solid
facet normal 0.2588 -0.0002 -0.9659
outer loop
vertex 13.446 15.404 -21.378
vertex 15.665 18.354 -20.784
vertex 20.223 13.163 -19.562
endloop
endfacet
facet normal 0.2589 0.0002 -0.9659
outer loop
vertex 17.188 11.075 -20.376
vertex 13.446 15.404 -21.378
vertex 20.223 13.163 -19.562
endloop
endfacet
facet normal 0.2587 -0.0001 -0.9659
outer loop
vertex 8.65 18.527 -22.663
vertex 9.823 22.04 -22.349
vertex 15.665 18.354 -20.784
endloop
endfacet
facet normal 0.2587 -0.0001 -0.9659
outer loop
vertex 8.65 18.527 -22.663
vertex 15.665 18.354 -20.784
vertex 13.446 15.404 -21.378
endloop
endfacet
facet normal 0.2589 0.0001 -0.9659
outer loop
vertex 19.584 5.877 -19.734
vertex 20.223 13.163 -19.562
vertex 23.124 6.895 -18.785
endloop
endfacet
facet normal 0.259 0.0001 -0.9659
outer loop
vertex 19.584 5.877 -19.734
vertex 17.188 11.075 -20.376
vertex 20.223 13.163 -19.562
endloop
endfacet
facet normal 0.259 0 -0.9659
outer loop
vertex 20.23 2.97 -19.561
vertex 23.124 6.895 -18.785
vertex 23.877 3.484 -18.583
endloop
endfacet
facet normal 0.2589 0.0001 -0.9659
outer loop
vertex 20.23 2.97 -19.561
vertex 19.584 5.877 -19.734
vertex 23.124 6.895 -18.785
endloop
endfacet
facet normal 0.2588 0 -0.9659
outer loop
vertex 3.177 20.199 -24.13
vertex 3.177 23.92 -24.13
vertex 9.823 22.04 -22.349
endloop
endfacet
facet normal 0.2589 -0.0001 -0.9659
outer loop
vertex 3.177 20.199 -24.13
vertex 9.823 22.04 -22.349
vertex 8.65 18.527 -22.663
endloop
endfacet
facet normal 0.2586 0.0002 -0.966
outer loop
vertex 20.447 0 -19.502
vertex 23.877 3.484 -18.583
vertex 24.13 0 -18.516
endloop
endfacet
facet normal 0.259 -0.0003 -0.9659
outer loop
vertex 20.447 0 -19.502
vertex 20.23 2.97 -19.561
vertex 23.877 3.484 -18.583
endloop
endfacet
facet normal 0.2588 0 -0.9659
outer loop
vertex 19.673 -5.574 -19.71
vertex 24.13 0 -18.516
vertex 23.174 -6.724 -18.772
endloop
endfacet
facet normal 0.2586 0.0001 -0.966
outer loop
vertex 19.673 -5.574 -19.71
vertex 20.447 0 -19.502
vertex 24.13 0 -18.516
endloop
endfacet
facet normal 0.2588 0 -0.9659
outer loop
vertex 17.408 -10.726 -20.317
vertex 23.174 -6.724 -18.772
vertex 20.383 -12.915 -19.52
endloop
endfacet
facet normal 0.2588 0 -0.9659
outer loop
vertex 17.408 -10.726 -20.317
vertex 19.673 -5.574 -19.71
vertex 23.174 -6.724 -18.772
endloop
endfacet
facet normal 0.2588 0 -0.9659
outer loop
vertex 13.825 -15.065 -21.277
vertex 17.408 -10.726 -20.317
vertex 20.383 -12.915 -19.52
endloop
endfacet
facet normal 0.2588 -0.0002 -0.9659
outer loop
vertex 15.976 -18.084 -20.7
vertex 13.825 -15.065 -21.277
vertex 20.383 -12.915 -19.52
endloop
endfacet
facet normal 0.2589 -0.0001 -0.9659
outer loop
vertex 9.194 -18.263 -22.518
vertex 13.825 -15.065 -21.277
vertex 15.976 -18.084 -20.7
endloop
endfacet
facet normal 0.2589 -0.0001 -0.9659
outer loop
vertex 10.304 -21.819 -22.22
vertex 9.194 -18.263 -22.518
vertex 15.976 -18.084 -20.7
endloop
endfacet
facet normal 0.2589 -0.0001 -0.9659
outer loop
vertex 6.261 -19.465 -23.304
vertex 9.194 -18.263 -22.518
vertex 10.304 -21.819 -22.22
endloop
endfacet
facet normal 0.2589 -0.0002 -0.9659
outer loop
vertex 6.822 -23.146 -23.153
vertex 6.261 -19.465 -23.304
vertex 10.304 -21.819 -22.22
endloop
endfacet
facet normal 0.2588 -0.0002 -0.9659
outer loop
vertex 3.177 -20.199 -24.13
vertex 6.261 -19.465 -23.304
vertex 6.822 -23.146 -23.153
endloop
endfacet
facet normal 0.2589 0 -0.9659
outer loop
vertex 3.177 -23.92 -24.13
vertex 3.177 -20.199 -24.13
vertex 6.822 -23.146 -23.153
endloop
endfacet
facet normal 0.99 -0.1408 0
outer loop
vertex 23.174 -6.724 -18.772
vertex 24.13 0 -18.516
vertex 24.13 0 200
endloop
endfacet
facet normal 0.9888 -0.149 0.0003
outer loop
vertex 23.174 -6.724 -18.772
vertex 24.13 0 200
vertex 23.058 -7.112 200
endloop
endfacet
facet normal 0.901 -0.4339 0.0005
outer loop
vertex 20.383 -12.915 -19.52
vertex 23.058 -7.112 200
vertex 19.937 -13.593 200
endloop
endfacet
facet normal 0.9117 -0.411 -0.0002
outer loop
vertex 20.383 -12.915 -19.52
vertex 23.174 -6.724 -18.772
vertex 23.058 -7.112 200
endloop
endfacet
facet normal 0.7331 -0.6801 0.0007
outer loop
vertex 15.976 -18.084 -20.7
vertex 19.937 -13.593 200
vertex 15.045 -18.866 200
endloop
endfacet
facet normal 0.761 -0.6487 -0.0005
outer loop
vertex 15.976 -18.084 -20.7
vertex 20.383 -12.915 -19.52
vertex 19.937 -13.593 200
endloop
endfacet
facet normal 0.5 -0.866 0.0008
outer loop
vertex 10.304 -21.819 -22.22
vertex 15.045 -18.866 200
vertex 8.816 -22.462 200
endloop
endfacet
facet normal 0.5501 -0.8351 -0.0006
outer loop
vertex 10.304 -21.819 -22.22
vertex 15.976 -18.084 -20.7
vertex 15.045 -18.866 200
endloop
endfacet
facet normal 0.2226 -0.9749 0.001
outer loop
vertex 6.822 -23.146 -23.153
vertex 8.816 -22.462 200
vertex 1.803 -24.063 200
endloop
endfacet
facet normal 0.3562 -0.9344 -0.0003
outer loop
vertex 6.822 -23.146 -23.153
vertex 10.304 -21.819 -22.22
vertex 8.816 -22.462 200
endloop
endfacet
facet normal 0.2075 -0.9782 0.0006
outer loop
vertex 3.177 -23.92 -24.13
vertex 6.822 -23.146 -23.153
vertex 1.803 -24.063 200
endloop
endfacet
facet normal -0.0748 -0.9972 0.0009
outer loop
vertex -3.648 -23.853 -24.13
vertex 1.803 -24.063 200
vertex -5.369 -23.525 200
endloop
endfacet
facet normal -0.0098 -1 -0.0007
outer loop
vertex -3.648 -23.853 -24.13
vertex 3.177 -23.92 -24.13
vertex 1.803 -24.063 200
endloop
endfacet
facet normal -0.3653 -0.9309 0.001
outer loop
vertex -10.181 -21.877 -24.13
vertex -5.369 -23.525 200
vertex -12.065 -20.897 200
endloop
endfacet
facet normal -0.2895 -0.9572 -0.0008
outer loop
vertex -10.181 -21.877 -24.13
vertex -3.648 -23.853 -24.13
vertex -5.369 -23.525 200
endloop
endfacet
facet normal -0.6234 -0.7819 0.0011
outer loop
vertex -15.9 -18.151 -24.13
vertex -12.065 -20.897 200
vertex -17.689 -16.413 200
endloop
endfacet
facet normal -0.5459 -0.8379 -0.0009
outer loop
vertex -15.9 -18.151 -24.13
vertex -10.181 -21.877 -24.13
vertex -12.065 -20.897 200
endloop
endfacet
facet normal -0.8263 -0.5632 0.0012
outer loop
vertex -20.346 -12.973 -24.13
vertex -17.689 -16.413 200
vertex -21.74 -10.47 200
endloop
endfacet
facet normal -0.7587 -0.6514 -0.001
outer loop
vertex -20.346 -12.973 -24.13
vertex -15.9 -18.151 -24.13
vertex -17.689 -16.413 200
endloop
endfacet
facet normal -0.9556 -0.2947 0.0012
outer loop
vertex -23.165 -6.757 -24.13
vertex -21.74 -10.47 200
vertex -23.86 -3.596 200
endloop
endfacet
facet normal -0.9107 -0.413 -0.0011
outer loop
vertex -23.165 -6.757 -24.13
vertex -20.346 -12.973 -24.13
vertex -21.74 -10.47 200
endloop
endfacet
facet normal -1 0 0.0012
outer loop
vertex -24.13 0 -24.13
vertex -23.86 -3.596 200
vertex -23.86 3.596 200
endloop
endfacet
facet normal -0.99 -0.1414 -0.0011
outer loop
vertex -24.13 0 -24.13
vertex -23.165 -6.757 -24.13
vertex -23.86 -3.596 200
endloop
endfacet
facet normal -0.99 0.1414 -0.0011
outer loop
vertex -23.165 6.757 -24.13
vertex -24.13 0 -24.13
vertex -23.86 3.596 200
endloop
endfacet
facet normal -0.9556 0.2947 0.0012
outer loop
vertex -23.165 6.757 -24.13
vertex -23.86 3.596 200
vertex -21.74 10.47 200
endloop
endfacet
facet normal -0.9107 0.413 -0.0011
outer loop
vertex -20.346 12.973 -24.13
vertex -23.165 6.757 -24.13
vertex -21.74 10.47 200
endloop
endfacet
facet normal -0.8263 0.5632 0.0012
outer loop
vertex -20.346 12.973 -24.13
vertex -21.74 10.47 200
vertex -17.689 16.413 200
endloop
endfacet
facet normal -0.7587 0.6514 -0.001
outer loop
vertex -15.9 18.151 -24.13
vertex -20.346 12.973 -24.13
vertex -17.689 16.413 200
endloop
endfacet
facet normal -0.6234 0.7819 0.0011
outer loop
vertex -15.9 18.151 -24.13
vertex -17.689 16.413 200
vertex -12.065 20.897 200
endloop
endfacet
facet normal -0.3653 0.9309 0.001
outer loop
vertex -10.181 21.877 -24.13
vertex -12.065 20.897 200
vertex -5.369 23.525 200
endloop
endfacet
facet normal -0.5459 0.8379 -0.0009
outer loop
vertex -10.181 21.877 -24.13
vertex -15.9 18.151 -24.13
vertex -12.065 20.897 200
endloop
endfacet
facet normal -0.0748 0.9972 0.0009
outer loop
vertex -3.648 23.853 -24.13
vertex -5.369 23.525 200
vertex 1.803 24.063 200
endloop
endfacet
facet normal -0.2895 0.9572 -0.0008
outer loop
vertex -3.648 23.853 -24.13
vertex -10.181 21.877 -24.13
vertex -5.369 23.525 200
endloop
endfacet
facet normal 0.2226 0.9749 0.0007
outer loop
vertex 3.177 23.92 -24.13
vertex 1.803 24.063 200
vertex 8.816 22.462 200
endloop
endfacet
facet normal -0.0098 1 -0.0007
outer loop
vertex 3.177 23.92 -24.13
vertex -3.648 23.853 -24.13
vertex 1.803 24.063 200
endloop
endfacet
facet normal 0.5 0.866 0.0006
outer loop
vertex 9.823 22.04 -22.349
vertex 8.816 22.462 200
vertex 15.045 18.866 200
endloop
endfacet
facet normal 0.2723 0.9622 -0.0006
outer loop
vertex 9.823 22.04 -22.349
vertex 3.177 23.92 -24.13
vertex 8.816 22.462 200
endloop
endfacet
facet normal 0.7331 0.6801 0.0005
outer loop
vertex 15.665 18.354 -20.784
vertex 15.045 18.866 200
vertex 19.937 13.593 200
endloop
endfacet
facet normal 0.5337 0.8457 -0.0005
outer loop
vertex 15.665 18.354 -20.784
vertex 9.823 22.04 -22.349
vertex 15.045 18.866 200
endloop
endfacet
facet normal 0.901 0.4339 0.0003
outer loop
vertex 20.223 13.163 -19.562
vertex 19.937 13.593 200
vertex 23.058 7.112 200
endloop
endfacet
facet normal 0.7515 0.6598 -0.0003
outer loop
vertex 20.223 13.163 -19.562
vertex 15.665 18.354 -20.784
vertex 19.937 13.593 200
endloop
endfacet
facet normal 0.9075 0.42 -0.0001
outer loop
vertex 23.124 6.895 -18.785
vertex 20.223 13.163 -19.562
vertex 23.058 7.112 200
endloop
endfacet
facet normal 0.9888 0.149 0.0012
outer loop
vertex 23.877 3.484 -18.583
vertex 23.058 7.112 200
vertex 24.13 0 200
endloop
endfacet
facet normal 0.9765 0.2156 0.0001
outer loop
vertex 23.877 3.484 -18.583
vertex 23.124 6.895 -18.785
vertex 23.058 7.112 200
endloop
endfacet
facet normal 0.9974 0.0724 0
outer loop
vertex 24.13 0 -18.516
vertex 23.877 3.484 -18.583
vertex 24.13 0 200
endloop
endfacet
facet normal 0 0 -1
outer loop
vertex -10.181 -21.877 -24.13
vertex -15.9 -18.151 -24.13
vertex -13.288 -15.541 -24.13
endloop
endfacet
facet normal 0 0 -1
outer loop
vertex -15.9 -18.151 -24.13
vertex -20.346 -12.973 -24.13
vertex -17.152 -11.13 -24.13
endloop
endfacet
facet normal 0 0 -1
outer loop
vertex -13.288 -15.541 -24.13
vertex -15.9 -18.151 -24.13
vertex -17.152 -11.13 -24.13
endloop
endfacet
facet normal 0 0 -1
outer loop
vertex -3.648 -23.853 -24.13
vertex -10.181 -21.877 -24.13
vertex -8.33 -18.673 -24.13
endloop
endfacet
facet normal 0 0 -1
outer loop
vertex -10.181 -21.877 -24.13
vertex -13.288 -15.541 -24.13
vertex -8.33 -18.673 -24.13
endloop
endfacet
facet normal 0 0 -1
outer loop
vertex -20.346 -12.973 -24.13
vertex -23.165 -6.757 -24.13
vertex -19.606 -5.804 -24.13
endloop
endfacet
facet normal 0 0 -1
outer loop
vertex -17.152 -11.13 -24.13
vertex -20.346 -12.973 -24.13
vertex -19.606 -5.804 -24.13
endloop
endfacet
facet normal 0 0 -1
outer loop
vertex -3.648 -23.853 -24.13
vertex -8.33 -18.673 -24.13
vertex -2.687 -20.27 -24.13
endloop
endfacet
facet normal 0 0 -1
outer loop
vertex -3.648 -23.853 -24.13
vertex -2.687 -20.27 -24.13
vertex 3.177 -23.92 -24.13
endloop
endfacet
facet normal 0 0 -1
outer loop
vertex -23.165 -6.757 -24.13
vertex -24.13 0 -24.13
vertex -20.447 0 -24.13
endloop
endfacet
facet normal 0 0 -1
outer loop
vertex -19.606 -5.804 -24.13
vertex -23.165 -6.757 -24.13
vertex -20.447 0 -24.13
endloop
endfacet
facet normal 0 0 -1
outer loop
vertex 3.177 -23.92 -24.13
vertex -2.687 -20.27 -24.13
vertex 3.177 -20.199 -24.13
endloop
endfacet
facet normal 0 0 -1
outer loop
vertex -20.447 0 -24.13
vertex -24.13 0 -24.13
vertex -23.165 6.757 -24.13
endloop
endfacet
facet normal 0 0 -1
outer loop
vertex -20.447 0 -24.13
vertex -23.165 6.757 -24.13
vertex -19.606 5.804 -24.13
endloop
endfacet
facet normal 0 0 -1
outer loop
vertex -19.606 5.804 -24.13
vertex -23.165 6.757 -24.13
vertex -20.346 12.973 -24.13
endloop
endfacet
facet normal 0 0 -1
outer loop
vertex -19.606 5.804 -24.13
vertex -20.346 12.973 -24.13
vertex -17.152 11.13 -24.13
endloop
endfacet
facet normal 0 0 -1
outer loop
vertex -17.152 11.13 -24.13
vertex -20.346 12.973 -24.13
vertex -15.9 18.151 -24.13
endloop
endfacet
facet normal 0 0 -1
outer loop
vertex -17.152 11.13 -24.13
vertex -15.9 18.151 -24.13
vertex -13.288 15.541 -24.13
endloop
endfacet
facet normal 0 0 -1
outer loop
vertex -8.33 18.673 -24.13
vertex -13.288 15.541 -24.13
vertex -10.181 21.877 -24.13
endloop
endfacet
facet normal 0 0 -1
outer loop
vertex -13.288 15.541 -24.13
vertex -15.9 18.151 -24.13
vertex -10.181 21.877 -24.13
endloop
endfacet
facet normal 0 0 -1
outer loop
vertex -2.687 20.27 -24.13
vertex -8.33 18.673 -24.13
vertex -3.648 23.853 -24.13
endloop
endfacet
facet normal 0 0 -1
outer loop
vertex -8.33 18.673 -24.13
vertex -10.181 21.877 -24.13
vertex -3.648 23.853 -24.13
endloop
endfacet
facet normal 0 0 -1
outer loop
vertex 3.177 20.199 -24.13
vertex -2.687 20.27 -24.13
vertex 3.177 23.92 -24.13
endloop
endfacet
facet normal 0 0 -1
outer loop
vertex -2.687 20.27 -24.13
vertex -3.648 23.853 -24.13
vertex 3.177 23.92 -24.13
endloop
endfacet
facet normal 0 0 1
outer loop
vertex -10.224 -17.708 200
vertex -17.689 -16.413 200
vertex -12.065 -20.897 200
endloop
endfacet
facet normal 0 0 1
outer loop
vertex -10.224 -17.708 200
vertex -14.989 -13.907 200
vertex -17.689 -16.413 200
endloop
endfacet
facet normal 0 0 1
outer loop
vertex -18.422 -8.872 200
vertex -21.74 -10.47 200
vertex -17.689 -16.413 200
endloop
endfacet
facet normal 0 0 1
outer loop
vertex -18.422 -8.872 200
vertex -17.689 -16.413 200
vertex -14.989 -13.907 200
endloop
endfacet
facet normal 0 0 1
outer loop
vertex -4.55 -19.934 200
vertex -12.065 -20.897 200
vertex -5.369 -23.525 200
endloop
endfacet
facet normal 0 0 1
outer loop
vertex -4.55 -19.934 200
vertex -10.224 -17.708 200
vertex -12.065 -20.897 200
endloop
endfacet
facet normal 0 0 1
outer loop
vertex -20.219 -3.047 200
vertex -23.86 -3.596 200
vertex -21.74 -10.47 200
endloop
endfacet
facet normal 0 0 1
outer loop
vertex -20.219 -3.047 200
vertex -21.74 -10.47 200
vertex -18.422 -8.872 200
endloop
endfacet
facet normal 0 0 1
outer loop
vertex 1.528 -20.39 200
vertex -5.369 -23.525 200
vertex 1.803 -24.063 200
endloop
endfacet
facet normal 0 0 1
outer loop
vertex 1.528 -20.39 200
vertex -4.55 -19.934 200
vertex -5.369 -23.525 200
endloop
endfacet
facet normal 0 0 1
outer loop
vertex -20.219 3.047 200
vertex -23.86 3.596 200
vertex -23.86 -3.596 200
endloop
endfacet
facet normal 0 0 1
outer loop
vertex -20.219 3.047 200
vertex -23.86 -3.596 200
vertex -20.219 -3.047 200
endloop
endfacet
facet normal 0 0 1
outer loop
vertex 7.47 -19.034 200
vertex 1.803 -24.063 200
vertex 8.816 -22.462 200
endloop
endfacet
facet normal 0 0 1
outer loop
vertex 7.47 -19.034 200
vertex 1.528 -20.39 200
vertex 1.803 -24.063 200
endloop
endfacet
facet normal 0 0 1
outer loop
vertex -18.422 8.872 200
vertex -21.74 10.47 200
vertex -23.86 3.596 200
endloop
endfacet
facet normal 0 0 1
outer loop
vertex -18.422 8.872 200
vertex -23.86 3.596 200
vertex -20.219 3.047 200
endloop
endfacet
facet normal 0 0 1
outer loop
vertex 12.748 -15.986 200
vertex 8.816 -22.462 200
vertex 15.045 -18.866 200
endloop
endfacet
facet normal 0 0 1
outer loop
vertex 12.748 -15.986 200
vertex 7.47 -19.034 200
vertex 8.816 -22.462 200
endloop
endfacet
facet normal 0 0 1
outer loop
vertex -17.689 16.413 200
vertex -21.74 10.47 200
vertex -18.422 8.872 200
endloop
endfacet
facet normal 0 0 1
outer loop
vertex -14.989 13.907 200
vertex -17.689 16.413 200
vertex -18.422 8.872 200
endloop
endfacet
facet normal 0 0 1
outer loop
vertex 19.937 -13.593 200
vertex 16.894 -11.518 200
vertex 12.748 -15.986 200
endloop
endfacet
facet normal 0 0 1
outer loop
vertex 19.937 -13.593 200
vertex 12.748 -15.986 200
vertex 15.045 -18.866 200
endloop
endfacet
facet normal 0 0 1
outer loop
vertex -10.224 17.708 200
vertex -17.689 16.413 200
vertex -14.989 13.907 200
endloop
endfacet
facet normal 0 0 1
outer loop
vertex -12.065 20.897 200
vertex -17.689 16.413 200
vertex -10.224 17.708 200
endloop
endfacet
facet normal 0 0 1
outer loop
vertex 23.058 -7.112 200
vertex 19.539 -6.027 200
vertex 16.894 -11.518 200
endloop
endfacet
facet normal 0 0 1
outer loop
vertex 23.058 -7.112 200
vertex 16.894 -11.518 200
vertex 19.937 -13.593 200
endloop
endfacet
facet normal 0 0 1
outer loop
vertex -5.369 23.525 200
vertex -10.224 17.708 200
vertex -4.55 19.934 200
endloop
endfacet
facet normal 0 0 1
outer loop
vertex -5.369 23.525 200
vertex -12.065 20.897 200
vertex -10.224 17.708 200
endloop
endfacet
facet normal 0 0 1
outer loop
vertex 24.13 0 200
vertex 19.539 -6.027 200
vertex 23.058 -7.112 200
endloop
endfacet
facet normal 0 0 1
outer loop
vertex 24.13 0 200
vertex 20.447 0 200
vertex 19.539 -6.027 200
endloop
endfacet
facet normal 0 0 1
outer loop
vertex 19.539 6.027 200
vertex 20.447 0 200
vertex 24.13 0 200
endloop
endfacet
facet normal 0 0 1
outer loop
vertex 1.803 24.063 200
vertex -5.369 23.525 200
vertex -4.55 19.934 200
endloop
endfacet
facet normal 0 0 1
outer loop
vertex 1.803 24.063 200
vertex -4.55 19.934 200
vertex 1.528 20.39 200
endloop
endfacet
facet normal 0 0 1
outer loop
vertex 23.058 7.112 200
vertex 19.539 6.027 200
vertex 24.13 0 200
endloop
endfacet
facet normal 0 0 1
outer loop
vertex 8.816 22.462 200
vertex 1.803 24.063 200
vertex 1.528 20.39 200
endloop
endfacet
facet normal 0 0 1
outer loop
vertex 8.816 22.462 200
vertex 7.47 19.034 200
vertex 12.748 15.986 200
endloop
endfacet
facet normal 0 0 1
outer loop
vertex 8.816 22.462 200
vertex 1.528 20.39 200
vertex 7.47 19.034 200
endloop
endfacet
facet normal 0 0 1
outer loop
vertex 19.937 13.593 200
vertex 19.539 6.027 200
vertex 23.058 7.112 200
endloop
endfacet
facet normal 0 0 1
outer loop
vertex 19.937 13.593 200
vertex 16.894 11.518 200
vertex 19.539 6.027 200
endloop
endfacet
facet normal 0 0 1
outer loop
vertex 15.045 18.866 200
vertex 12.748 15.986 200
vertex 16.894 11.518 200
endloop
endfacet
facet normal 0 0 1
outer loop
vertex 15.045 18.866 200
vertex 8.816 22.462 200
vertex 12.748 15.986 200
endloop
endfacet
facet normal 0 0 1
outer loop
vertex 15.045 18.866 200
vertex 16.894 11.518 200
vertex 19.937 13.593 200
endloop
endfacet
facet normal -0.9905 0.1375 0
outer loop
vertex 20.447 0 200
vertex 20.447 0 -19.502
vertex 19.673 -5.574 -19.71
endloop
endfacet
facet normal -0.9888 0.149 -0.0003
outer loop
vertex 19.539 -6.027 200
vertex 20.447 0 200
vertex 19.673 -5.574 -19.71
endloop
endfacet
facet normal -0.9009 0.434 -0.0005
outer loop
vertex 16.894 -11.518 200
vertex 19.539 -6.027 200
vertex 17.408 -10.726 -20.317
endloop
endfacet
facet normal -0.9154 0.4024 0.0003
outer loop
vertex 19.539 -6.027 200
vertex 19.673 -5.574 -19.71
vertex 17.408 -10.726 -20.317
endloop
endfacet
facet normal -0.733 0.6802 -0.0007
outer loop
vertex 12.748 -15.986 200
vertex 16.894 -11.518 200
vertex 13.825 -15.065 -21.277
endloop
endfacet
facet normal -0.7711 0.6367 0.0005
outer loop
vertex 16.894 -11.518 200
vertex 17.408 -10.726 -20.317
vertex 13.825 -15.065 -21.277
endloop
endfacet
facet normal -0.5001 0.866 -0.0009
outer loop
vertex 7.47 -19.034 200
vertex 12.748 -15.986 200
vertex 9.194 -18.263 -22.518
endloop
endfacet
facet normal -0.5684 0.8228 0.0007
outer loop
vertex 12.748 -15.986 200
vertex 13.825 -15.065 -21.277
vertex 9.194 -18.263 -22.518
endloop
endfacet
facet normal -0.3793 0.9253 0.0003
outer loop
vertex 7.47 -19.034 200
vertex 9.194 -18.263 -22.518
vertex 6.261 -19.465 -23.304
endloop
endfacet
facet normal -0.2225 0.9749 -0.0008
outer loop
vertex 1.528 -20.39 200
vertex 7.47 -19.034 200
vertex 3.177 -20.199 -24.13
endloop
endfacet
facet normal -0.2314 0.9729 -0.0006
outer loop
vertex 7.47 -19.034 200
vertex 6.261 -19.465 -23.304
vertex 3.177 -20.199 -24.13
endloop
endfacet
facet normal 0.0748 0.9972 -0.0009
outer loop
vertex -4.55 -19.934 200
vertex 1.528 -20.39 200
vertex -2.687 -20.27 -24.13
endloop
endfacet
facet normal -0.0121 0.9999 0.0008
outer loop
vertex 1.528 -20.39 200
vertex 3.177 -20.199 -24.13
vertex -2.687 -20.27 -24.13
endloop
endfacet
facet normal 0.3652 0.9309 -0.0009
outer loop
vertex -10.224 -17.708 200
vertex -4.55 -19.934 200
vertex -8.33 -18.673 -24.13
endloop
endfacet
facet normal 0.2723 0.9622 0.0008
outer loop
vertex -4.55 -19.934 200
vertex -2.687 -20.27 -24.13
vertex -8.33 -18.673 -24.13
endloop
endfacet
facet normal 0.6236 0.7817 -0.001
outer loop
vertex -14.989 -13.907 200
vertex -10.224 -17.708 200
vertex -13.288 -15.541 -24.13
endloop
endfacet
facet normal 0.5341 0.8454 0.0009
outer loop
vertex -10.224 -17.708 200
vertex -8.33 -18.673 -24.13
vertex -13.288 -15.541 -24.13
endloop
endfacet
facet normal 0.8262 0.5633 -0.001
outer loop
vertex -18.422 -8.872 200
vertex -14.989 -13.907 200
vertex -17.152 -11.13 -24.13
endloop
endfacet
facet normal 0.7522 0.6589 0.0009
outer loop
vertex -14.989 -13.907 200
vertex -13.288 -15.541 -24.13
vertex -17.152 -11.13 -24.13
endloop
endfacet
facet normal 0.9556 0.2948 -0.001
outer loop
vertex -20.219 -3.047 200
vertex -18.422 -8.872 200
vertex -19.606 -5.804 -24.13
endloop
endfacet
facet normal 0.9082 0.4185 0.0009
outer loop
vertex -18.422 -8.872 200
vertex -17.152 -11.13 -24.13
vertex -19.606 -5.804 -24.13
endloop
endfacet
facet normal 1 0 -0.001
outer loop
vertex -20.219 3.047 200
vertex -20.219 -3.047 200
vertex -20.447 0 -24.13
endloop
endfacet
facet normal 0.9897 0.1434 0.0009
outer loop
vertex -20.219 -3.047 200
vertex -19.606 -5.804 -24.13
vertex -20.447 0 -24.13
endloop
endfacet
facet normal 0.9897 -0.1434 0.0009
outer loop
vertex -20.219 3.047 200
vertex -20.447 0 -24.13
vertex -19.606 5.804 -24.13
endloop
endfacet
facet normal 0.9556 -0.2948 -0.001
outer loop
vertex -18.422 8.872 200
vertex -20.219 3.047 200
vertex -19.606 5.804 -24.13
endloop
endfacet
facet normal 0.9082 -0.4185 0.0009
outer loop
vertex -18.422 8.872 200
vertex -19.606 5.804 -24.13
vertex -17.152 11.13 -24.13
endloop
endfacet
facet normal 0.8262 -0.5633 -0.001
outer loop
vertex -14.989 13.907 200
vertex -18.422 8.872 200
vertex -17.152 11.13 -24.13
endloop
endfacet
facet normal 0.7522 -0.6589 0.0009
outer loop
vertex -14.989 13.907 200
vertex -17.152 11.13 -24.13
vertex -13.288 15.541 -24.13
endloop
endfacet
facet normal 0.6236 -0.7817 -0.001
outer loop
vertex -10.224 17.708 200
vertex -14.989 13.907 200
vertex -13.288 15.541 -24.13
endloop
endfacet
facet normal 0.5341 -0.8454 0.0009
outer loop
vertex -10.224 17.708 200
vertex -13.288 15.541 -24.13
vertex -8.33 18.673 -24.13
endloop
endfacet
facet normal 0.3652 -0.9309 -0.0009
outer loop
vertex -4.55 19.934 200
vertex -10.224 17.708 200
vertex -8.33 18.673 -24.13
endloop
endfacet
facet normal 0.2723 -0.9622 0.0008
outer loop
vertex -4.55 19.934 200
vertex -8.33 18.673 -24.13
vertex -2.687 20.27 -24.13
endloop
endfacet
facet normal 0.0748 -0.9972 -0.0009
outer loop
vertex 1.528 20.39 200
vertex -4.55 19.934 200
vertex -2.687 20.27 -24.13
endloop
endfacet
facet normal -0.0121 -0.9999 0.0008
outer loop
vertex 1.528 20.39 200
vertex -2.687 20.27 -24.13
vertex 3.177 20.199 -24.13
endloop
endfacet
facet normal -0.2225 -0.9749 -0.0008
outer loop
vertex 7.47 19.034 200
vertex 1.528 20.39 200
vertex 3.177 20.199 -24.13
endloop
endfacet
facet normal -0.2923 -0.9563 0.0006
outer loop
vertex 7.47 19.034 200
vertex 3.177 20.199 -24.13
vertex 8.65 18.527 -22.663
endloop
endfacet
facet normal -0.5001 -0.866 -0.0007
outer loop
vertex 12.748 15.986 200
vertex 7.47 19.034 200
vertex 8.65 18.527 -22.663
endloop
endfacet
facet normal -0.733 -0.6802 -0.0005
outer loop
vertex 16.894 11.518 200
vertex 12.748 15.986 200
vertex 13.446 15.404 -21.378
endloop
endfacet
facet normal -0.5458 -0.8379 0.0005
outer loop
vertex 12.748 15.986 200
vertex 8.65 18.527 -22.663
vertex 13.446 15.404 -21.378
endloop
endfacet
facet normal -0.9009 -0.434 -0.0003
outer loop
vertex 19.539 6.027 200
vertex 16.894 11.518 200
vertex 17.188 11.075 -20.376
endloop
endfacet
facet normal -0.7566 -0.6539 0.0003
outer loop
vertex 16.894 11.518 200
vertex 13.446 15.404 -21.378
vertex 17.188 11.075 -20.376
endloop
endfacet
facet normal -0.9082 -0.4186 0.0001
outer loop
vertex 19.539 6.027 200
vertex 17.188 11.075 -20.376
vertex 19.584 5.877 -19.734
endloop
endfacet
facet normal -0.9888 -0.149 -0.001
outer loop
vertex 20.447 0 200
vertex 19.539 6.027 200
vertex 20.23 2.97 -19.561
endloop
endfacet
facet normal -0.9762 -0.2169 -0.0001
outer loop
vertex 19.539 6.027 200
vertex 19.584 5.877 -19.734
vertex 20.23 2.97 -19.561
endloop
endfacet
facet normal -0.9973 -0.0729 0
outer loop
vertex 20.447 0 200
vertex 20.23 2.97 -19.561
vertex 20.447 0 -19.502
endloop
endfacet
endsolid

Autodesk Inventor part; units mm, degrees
ref_plane "Start Plane" through (0, 0, -24.13) normal (0, 0, 1) x (1, 0, 0)
ref_plane "End Plane" through (0, 0, 200) normal (0, 0, 1) x (1, 0, 0)
sketch "Sketch" plane through (0, 0, 0) normal (0, 0, 1) x (1, 0, 0)
  circle A0 centre (0, 0) radius 20.447
  circle A1 centre (0, 0) radius 24.13
  dimension "d0" = 48.26
  dimension "d1" = 3.683
extrude "Body" add sketch "Sketch" along normal up to surface (224.13 mm away) from surface at -24.13
sketch "Sketch3" plane through (0, 0, 0) normal (0, 0, 1) x (1, 0, 0)
  line L0 (0, 0) -> (10, 0)
ref_plane "Work Plane3" through (0, 0, 0) normal (0, -1, 0) x (1, 0, 0)
ref_plane "Work Plane4" through (-1133.3597, 0, -328.664) normal (0.2588, 0, -0.9659) x (-0.9659, 0, -0.2588)
split "Split1" plane through (-1133.3597, 0, -328.664) removes the side toward (0.2588, 0, -0.9659)
ref_plane "Work Plane5" through (0, 2000, -24.13) normal (0, 0, -1) x (-1, 0, 0)
split "Split2" plane through (0, 2000, -24.13) removes the side toward (0, 0, -1)
sketch "Sketch4" plane through (0, 0, 0) normal (0, -1, 0) x (1, 0, 0)
  line L0 (-2, -24.13) -> (12, -24.13) projected
  line L1 (-2, 200) -> (12, 200) projected
  dimension "d7" = 224.13
equation "\"d0\" = G_H"
equation "\"d1\" = G_T"
equation "\"d2\" = G_L"
equation "\"G_H\" = 48.26"
equation "\"G_T\" = 3.683"
equation "\"G_L\" = d7"
equation "\"G_OFFSET_START\" = 24.13"
equation "\"G_OFFSET_END\" = 0"
equation "\"d4\" = -G_OFFSET_START"
equation "\"d5\" = G_OFFSET_END + B_L"
equation "\"B_L\" = 200"
properties part number "ANSI - 1 1/2 x 0.145 - 8.824" material "Steel, Mild"
